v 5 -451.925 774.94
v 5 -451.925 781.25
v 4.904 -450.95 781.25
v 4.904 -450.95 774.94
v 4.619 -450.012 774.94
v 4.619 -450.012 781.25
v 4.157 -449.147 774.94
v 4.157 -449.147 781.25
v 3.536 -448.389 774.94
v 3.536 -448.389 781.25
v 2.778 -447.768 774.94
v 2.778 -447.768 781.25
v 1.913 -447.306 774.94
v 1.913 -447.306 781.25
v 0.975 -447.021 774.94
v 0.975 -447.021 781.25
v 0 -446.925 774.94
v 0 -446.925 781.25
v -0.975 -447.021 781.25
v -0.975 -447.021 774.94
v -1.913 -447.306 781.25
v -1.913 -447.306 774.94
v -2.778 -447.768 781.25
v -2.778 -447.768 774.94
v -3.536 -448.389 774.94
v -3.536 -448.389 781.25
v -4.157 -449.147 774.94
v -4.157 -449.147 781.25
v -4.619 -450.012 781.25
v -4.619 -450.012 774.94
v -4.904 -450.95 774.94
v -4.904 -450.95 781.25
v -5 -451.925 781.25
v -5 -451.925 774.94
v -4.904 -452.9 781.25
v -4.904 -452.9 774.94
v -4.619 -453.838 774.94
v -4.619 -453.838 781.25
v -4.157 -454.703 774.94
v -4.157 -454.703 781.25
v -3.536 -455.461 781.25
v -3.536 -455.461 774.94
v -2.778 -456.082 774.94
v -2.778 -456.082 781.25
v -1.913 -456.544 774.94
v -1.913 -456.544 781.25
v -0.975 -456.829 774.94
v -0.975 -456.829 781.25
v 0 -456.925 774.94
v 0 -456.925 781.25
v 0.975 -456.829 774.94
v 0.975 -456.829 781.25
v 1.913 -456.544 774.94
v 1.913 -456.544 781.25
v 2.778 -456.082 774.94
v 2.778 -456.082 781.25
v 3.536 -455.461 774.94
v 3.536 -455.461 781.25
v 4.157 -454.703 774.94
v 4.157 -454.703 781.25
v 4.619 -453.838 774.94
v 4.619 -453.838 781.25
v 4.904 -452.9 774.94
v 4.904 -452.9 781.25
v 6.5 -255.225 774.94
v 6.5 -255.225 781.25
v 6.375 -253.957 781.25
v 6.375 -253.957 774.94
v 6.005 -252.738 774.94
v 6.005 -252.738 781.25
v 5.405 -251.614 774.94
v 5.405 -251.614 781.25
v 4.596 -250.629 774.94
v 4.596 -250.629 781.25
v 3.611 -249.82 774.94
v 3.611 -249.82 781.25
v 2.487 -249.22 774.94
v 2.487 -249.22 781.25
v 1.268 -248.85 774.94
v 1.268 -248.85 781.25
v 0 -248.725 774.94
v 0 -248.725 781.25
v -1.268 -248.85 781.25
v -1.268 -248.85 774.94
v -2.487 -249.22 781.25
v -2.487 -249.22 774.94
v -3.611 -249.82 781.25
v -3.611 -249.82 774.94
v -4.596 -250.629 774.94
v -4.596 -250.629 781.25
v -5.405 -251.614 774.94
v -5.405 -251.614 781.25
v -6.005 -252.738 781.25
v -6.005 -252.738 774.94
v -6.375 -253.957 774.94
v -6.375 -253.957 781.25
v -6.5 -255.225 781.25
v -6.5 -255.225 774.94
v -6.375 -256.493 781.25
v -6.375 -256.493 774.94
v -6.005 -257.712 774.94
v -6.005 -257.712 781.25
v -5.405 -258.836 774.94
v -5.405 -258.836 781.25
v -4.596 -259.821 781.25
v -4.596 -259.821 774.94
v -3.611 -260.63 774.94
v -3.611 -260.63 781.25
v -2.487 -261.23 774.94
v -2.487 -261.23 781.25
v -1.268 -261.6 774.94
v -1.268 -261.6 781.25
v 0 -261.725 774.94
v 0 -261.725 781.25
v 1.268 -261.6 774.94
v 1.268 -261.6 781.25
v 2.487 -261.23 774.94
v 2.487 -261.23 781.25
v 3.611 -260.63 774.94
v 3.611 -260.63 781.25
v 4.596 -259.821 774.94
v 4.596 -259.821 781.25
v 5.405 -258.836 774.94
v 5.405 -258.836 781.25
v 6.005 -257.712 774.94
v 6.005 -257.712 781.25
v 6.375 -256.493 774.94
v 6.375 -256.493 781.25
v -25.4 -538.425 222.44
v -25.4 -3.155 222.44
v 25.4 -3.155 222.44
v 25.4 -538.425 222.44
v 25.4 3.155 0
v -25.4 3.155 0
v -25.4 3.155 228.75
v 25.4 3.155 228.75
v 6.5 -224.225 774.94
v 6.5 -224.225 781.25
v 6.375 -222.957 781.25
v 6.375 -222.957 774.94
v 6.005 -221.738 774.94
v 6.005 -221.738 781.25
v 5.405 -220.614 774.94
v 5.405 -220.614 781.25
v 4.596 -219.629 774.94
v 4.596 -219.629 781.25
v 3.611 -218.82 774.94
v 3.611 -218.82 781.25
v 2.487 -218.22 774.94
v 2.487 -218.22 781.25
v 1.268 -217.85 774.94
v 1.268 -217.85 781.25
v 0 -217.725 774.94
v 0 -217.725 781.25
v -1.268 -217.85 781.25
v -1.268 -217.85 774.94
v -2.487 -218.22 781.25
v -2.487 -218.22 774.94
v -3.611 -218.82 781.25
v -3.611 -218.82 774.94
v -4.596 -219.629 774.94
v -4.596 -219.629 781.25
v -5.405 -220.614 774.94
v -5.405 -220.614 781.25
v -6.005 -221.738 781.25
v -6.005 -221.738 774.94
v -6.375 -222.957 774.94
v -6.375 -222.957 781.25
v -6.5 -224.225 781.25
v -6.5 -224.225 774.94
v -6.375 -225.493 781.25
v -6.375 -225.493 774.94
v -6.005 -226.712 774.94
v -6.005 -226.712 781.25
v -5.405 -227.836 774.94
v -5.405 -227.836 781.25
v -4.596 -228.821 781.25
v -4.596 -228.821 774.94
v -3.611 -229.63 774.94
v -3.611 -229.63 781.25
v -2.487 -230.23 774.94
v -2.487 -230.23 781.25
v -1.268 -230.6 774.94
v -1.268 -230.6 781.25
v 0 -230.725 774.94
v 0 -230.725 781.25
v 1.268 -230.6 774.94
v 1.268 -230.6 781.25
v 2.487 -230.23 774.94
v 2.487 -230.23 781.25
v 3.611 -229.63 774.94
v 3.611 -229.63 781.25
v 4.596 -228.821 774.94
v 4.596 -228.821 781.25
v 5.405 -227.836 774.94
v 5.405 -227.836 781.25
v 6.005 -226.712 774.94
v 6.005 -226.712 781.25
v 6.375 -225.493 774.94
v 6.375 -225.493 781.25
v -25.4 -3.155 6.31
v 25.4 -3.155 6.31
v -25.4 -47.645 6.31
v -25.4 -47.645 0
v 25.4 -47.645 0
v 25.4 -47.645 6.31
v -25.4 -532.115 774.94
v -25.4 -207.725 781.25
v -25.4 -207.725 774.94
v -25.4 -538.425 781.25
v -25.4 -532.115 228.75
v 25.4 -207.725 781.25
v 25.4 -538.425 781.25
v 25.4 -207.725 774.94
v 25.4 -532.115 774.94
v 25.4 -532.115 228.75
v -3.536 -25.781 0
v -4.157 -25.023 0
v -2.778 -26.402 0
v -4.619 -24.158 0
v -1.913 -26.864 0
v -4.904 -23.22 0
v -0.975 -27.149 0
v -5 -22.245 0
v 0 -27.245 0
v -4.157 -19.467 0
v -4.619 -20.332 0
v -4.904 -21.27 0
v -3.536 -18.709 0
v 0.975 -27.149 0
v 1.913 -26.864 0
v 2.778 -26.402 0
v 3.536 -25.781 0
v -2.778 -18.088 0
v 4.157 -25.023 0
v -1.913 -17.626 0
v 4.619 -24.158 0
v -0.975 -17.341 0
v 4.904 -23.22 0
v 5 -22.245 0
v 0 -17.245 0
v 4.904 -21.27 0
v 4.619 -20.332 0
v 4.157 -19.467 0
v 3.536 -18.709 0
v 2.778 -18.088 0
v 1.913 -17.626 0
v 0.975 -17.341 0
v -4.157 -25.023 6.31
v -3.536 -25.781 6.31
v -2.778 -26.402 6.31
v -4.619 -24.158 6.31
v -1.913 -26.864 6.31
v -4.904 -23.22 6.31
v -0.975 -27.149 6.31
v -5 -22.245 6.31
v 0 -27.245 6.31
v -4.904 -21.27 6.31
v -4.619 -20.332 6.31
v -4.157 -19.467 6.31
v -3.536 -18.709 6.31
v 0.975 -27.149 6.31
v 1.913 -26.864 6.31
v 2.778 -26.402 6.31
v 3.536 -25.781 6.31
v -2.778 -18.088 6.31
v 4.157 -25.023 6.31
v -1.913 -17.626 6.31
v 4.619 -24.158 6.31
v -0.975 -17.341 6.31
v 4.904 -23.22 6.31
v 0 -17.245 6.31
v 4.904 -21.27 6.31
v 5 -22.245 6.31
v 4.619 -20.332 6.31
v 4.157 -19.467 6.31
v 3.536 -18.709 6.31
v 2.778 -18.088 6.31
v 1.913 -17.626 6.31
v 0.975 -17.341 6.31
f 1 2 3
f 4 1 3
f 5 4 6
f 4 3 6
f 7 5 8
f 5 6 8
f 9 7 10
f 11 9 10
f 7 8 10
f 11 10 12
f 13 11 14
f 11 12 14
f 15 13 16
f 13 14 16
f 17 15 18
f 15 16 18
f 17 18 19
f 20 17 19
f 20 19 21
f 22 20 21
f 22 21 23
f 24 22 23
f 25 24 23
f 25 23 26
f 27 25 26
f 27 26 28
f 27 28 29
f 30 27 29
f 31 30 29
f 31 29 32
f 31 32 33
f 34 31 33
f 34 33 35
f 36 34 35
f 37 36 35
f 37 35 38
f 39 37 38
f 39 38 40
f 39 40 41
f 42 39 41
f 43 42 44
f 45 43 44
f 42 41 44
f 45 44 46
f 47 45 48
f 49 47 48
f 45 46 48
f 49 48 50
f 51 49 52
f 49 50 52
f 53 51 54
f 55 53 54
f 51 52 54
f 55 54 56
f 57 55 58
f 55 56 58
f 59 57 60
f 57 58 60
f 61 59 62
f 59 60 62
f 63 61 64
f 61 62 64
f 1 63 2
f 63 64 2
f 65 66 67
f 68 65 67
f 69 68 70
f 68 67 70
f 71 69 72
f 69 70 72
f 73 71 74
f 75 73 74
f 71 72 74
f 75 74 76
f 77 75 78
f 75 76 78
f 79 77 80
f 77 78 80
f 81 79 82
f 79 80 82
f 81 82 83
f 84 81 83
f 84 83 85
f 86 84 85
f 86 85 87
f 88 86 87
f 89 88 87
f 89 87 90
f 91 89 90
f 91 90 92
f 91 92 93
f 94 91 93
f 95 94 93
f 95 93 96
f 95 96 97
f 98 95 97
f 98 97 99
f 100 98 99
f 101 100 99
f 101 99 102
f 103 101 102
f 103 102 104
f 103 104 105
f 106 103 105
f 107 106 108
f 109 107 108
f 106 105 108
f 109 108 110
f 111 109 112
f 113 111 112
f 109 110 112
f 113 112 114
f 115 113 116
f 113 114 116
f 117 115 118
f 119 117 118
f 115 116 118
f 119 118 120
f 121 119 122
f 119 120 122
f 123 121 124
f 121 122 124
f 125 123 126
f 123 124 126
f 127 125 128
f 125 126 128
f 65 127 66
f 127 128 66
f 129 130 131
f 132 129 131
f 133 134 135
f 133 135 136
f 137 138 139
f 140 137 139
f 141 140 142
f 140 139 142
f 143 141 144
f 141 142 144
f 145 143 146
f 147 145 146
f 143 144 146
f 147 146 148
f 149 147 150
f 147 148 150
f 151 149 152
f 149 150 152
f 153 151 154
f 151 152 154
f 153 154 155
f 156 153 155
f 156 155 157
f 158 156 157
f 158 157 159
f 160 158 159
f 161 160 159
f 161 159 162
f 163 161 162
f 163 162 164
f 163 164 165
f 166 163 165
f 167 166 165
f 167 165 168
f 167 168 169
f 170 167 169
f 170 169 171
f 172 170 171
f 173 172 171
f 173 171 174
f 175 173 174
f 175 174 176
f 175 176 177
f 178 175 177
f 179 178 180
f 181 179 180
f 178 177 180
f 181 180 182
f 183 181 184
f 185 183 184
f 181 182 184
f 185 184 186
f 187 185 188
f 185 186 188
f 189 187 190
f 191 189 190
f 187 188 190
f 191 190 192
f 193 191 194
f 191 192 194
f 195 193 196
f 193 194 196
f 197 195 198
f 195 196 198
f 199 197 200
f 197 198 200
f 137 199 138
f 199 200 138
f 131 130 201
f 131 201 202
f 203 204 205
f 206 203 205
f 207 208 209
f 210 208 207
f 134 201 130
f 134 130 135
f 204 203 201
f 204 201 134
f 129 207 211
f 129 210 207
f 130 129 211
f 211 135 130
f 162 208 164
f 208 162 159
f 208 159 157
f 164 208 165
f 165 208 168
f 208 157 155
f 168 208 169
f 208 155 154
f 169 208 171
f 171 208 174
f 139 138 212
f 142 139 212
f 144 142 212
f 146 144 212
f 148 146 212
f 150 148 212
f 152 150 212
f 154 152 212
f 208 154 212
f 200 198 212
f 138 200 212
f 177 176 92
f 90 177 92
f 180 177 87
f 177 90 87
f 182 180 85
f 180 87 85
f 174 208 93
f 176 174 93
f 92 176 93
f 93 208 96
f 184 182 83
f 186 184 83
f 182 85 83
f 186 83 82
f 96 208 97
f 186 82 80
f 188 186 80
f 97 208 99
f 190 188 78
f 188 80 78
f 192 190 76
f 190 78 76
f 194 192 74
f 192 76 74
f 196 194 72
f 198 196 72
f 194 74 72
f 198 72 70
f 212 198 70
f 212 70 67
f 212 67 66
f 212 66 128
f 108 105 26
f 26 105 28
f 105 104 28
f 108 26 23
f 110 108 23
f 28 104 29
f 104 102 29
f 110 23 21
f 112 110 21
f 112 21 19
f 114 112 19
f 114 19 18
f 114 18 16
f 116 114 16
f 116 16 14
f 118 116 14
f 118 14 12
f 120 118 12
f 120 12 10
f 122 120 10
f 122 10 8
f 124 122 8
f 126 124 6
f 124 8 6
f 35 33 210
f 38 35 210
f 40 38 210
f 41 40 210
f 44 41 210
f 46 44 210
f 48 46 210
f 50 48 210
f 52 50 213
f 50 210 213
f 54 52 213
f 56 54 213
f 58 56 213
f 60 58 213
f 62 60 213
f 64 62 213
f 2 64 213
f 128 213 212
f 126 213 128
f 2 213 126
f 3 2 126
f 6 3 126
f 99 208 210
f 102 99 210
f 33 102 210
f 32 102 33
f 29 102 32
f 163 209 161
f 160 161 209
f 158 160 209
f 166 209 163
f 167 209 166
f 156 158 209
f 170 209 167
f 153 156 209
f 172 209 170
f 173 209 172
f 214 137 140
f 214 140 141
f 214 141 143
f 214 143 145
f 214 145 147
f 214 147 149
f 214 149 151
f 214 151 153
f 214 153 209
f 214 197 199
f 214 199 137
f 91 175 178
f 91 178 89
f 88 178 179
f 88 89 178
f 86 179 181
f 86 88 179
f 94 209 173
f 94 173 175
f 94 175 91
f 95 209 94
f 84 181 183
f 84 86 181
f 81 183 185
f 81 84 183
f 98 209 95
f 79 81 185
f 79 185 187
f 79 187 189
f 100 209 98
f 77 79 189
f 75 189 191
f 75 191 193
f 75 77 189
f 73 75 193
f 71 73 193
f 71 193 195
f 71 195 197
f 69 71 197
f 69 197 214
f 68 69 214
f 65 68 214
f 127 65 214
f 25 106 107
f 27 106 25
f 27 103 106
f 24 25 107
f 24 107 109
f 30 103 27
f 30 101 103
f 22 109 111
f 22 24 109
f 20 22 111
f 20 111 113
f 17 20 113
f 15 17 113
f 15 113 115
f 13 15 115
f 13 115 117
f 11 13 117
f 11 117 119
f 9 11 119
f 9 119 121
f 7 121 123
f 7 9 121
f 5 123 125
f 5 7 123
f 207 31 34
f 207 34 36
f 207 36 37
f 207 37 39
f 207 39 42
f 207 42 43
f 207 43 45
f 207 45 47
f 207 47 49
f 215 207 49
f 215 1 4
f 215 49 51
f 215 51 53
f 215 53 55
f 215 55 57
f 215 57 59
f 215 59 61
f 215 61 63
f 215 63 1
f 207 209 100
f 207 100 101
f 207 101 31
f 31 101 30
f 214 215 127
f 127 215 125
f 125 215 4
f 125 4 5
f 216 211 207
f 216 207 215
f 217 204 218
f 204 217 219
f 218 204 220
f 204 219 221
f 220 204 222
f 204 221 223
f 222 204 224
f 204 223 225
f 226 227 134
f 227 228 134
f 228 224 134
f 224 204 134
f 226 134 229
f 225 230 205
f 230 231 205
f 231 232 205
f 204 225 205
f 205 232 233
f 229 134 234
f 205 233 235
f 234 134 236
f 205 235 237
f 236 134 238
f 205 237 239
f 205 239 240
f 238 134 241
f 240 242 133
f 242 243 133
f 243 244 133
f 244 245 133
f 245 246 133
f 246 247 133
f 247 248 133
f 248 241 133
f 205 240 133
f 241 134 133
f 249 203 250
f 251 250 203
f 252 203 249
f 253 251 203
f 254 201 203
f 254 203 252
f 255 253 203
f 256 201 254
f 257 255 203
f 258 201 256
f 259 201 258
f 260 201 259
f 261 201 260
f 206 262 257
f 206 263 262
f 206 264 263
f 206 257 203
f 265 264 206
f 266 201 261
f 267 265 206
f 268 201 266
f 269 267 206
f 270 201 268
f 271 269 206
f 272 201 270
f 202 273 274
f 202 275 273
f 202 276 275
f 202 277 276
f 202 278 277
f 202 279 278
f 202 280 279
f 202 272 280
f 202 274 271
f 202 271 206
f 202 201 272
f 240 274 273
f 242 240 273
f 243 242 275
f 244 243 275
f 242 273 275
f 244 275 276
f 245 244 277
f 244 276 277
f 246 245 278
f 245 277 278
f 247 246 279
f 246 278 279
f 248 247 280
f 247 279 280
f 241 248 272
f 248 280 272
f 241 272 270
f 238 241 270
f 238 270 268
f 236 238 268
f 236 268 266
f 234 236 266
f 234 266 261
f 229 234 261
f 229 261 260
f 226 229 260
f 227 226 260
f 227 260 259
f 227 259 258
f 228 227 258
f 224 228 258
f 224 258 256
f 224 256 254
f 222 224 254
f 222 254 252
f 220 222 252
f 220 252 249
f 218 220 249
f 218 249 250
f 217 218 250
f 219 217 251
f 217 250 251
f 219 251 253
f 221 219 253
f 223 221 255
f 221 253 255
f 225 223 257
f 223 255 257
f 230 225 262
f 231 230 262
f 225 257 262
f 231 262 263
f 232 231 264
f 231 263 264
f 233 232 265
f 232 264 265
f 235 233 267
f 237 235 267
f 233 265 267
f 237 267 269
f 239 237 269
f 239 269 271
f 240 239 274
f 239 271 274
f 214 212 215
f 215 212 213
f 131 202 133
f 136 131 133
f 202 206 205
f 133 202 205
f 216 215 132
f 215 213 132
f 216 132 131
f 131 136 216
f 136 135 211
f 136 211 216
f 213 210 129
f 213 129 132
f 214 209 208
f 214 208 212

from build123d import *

# Parameters (mm, degrees)
CROQUIS1_W              = 50.8
CROQUIS1_H              = 6.31
SALIENTE_EXTRUIR1_DEPTH = 228.75
CROQUIS2_W              = 50.8
CROQUIS2_H              = 6.31
SALIENTE_EXTRUIR2_DEPTH = 535.27
CROQUIS3_W              = 50.8
CROQUIS3_H              = 6.31
SALIENTE_EXTRUIR3_DEPTH = 552.5
CROQUIS4_W              = 50.8
CROQUIS4_H              = 6.31
SALIENTE_EXTRUIR4_DEPTH = 324.39
CROQUIS5_W              = 50.8
CROQUIS5_H              = 6.31
SALIENTE_EXTRUIR5_DEPTH = 50.8
CROQUIS7_R              = 5
CORTAR_EXTRUIR2_DEPTH   = 415.8
CROQUIS8_R              = 6.5
CORTAR_EXTRUIR3_DEPTH   = 10
CROQUIS9_R              = 5
CORTAR_EXTRUIR4_DEPTH   = 35


with BuildPart() as part:
    # Croquis1 → Saliente-Extruir1 (new body)
    with BuildSketch(Plane.XY):
        Rectangle(CROQUIS1_W, CROQUIS1_H)
    extrude(amount=SALIENTE_EXTRUIR1_DEPTH)

    # Croquis2 → Saliente-Extruir2 (add)
    with BuildSketch(Plane.XZ.offset(3.155)):
        with Locations((0, 225.595)):
            Rectangle(CROQUIS2_W, CROQUIS2_H)
    extrude(amount=SALIENTE_EXTRUIR2_DEPTH)

    # Croquis3 → Saliente-Extruir3 (add)
    with BuildSketch(Plane.XY.offset(228.75)):
        with Locations((0, -535.27)):
            Rectangle(CROQUIS3_W, CROQUIS3_H)
    extrude(amount=SALIENTE_EXTRUIR3_DEPTH)

    # Croquis4 → Saliente-Extruir4 (add)
    with BuildSketch(Plane(origin=(0, -532.115, 0), x_dir=(1, 0, 0), z_dir=(0, 1, 0))):
        with Locations((0, -778.095)):
            Rectangle(CROQUIS4_W, CROQUIS4_H)
    extrude(amount=SALIENTE_EXTRUIR4_DEPTH)

    # Croquis5 → Saliente-Extruir5 (add)
    with BuildSketch(Plane(origin=(0, 3.155, 0), x_dir=(1, 0, 0), z_dir=(0, 1, 0))):
        with Locations((0, -3.155)):
            Rectangle(CROQUIS5_W, CROQUIS5_H)
    extrude(amount=-SALIENTE_EXTRUIR5_DEPTH)

    # Croquis7 → Cortar-Extruir2 (cut)
    with BuildSketch(Plane.XY.offset(6.31)):
        with Locations((0, -22.245)):
            Circle(CROQUIS7_R)
    extrude(amount=-CORTAR_EXTRUIR2_DEPTH, mode=Mode.SUBTRACT)

    # Croquis8 → Cortar-Extruir3 (cut)
    with BuildSketch(Plane.XY.offset(781.25)):
        with Locations((0, -224.225)):
            Circle(CROQUIS8_R)
        with Locations((0, -255.225)):
            Circle(CROQUIS8_R)
    extrude(amount=-CORTAR_EXTRUIR3_DEPTH, mode=Mode.SUBTRACT)

    # Croquis9 → Cortar-Extruir4 (cut)
    with BuildSketch(Plane.XY.offset(781.25)):
        with Locations((0, -451.925)):
            Circle(CROQUIS9_R)
    extrude(amount=-CORTAR_EXTRUIR4_DEPTH, mode=Mode.SUBTRACT)


solid = part.part
